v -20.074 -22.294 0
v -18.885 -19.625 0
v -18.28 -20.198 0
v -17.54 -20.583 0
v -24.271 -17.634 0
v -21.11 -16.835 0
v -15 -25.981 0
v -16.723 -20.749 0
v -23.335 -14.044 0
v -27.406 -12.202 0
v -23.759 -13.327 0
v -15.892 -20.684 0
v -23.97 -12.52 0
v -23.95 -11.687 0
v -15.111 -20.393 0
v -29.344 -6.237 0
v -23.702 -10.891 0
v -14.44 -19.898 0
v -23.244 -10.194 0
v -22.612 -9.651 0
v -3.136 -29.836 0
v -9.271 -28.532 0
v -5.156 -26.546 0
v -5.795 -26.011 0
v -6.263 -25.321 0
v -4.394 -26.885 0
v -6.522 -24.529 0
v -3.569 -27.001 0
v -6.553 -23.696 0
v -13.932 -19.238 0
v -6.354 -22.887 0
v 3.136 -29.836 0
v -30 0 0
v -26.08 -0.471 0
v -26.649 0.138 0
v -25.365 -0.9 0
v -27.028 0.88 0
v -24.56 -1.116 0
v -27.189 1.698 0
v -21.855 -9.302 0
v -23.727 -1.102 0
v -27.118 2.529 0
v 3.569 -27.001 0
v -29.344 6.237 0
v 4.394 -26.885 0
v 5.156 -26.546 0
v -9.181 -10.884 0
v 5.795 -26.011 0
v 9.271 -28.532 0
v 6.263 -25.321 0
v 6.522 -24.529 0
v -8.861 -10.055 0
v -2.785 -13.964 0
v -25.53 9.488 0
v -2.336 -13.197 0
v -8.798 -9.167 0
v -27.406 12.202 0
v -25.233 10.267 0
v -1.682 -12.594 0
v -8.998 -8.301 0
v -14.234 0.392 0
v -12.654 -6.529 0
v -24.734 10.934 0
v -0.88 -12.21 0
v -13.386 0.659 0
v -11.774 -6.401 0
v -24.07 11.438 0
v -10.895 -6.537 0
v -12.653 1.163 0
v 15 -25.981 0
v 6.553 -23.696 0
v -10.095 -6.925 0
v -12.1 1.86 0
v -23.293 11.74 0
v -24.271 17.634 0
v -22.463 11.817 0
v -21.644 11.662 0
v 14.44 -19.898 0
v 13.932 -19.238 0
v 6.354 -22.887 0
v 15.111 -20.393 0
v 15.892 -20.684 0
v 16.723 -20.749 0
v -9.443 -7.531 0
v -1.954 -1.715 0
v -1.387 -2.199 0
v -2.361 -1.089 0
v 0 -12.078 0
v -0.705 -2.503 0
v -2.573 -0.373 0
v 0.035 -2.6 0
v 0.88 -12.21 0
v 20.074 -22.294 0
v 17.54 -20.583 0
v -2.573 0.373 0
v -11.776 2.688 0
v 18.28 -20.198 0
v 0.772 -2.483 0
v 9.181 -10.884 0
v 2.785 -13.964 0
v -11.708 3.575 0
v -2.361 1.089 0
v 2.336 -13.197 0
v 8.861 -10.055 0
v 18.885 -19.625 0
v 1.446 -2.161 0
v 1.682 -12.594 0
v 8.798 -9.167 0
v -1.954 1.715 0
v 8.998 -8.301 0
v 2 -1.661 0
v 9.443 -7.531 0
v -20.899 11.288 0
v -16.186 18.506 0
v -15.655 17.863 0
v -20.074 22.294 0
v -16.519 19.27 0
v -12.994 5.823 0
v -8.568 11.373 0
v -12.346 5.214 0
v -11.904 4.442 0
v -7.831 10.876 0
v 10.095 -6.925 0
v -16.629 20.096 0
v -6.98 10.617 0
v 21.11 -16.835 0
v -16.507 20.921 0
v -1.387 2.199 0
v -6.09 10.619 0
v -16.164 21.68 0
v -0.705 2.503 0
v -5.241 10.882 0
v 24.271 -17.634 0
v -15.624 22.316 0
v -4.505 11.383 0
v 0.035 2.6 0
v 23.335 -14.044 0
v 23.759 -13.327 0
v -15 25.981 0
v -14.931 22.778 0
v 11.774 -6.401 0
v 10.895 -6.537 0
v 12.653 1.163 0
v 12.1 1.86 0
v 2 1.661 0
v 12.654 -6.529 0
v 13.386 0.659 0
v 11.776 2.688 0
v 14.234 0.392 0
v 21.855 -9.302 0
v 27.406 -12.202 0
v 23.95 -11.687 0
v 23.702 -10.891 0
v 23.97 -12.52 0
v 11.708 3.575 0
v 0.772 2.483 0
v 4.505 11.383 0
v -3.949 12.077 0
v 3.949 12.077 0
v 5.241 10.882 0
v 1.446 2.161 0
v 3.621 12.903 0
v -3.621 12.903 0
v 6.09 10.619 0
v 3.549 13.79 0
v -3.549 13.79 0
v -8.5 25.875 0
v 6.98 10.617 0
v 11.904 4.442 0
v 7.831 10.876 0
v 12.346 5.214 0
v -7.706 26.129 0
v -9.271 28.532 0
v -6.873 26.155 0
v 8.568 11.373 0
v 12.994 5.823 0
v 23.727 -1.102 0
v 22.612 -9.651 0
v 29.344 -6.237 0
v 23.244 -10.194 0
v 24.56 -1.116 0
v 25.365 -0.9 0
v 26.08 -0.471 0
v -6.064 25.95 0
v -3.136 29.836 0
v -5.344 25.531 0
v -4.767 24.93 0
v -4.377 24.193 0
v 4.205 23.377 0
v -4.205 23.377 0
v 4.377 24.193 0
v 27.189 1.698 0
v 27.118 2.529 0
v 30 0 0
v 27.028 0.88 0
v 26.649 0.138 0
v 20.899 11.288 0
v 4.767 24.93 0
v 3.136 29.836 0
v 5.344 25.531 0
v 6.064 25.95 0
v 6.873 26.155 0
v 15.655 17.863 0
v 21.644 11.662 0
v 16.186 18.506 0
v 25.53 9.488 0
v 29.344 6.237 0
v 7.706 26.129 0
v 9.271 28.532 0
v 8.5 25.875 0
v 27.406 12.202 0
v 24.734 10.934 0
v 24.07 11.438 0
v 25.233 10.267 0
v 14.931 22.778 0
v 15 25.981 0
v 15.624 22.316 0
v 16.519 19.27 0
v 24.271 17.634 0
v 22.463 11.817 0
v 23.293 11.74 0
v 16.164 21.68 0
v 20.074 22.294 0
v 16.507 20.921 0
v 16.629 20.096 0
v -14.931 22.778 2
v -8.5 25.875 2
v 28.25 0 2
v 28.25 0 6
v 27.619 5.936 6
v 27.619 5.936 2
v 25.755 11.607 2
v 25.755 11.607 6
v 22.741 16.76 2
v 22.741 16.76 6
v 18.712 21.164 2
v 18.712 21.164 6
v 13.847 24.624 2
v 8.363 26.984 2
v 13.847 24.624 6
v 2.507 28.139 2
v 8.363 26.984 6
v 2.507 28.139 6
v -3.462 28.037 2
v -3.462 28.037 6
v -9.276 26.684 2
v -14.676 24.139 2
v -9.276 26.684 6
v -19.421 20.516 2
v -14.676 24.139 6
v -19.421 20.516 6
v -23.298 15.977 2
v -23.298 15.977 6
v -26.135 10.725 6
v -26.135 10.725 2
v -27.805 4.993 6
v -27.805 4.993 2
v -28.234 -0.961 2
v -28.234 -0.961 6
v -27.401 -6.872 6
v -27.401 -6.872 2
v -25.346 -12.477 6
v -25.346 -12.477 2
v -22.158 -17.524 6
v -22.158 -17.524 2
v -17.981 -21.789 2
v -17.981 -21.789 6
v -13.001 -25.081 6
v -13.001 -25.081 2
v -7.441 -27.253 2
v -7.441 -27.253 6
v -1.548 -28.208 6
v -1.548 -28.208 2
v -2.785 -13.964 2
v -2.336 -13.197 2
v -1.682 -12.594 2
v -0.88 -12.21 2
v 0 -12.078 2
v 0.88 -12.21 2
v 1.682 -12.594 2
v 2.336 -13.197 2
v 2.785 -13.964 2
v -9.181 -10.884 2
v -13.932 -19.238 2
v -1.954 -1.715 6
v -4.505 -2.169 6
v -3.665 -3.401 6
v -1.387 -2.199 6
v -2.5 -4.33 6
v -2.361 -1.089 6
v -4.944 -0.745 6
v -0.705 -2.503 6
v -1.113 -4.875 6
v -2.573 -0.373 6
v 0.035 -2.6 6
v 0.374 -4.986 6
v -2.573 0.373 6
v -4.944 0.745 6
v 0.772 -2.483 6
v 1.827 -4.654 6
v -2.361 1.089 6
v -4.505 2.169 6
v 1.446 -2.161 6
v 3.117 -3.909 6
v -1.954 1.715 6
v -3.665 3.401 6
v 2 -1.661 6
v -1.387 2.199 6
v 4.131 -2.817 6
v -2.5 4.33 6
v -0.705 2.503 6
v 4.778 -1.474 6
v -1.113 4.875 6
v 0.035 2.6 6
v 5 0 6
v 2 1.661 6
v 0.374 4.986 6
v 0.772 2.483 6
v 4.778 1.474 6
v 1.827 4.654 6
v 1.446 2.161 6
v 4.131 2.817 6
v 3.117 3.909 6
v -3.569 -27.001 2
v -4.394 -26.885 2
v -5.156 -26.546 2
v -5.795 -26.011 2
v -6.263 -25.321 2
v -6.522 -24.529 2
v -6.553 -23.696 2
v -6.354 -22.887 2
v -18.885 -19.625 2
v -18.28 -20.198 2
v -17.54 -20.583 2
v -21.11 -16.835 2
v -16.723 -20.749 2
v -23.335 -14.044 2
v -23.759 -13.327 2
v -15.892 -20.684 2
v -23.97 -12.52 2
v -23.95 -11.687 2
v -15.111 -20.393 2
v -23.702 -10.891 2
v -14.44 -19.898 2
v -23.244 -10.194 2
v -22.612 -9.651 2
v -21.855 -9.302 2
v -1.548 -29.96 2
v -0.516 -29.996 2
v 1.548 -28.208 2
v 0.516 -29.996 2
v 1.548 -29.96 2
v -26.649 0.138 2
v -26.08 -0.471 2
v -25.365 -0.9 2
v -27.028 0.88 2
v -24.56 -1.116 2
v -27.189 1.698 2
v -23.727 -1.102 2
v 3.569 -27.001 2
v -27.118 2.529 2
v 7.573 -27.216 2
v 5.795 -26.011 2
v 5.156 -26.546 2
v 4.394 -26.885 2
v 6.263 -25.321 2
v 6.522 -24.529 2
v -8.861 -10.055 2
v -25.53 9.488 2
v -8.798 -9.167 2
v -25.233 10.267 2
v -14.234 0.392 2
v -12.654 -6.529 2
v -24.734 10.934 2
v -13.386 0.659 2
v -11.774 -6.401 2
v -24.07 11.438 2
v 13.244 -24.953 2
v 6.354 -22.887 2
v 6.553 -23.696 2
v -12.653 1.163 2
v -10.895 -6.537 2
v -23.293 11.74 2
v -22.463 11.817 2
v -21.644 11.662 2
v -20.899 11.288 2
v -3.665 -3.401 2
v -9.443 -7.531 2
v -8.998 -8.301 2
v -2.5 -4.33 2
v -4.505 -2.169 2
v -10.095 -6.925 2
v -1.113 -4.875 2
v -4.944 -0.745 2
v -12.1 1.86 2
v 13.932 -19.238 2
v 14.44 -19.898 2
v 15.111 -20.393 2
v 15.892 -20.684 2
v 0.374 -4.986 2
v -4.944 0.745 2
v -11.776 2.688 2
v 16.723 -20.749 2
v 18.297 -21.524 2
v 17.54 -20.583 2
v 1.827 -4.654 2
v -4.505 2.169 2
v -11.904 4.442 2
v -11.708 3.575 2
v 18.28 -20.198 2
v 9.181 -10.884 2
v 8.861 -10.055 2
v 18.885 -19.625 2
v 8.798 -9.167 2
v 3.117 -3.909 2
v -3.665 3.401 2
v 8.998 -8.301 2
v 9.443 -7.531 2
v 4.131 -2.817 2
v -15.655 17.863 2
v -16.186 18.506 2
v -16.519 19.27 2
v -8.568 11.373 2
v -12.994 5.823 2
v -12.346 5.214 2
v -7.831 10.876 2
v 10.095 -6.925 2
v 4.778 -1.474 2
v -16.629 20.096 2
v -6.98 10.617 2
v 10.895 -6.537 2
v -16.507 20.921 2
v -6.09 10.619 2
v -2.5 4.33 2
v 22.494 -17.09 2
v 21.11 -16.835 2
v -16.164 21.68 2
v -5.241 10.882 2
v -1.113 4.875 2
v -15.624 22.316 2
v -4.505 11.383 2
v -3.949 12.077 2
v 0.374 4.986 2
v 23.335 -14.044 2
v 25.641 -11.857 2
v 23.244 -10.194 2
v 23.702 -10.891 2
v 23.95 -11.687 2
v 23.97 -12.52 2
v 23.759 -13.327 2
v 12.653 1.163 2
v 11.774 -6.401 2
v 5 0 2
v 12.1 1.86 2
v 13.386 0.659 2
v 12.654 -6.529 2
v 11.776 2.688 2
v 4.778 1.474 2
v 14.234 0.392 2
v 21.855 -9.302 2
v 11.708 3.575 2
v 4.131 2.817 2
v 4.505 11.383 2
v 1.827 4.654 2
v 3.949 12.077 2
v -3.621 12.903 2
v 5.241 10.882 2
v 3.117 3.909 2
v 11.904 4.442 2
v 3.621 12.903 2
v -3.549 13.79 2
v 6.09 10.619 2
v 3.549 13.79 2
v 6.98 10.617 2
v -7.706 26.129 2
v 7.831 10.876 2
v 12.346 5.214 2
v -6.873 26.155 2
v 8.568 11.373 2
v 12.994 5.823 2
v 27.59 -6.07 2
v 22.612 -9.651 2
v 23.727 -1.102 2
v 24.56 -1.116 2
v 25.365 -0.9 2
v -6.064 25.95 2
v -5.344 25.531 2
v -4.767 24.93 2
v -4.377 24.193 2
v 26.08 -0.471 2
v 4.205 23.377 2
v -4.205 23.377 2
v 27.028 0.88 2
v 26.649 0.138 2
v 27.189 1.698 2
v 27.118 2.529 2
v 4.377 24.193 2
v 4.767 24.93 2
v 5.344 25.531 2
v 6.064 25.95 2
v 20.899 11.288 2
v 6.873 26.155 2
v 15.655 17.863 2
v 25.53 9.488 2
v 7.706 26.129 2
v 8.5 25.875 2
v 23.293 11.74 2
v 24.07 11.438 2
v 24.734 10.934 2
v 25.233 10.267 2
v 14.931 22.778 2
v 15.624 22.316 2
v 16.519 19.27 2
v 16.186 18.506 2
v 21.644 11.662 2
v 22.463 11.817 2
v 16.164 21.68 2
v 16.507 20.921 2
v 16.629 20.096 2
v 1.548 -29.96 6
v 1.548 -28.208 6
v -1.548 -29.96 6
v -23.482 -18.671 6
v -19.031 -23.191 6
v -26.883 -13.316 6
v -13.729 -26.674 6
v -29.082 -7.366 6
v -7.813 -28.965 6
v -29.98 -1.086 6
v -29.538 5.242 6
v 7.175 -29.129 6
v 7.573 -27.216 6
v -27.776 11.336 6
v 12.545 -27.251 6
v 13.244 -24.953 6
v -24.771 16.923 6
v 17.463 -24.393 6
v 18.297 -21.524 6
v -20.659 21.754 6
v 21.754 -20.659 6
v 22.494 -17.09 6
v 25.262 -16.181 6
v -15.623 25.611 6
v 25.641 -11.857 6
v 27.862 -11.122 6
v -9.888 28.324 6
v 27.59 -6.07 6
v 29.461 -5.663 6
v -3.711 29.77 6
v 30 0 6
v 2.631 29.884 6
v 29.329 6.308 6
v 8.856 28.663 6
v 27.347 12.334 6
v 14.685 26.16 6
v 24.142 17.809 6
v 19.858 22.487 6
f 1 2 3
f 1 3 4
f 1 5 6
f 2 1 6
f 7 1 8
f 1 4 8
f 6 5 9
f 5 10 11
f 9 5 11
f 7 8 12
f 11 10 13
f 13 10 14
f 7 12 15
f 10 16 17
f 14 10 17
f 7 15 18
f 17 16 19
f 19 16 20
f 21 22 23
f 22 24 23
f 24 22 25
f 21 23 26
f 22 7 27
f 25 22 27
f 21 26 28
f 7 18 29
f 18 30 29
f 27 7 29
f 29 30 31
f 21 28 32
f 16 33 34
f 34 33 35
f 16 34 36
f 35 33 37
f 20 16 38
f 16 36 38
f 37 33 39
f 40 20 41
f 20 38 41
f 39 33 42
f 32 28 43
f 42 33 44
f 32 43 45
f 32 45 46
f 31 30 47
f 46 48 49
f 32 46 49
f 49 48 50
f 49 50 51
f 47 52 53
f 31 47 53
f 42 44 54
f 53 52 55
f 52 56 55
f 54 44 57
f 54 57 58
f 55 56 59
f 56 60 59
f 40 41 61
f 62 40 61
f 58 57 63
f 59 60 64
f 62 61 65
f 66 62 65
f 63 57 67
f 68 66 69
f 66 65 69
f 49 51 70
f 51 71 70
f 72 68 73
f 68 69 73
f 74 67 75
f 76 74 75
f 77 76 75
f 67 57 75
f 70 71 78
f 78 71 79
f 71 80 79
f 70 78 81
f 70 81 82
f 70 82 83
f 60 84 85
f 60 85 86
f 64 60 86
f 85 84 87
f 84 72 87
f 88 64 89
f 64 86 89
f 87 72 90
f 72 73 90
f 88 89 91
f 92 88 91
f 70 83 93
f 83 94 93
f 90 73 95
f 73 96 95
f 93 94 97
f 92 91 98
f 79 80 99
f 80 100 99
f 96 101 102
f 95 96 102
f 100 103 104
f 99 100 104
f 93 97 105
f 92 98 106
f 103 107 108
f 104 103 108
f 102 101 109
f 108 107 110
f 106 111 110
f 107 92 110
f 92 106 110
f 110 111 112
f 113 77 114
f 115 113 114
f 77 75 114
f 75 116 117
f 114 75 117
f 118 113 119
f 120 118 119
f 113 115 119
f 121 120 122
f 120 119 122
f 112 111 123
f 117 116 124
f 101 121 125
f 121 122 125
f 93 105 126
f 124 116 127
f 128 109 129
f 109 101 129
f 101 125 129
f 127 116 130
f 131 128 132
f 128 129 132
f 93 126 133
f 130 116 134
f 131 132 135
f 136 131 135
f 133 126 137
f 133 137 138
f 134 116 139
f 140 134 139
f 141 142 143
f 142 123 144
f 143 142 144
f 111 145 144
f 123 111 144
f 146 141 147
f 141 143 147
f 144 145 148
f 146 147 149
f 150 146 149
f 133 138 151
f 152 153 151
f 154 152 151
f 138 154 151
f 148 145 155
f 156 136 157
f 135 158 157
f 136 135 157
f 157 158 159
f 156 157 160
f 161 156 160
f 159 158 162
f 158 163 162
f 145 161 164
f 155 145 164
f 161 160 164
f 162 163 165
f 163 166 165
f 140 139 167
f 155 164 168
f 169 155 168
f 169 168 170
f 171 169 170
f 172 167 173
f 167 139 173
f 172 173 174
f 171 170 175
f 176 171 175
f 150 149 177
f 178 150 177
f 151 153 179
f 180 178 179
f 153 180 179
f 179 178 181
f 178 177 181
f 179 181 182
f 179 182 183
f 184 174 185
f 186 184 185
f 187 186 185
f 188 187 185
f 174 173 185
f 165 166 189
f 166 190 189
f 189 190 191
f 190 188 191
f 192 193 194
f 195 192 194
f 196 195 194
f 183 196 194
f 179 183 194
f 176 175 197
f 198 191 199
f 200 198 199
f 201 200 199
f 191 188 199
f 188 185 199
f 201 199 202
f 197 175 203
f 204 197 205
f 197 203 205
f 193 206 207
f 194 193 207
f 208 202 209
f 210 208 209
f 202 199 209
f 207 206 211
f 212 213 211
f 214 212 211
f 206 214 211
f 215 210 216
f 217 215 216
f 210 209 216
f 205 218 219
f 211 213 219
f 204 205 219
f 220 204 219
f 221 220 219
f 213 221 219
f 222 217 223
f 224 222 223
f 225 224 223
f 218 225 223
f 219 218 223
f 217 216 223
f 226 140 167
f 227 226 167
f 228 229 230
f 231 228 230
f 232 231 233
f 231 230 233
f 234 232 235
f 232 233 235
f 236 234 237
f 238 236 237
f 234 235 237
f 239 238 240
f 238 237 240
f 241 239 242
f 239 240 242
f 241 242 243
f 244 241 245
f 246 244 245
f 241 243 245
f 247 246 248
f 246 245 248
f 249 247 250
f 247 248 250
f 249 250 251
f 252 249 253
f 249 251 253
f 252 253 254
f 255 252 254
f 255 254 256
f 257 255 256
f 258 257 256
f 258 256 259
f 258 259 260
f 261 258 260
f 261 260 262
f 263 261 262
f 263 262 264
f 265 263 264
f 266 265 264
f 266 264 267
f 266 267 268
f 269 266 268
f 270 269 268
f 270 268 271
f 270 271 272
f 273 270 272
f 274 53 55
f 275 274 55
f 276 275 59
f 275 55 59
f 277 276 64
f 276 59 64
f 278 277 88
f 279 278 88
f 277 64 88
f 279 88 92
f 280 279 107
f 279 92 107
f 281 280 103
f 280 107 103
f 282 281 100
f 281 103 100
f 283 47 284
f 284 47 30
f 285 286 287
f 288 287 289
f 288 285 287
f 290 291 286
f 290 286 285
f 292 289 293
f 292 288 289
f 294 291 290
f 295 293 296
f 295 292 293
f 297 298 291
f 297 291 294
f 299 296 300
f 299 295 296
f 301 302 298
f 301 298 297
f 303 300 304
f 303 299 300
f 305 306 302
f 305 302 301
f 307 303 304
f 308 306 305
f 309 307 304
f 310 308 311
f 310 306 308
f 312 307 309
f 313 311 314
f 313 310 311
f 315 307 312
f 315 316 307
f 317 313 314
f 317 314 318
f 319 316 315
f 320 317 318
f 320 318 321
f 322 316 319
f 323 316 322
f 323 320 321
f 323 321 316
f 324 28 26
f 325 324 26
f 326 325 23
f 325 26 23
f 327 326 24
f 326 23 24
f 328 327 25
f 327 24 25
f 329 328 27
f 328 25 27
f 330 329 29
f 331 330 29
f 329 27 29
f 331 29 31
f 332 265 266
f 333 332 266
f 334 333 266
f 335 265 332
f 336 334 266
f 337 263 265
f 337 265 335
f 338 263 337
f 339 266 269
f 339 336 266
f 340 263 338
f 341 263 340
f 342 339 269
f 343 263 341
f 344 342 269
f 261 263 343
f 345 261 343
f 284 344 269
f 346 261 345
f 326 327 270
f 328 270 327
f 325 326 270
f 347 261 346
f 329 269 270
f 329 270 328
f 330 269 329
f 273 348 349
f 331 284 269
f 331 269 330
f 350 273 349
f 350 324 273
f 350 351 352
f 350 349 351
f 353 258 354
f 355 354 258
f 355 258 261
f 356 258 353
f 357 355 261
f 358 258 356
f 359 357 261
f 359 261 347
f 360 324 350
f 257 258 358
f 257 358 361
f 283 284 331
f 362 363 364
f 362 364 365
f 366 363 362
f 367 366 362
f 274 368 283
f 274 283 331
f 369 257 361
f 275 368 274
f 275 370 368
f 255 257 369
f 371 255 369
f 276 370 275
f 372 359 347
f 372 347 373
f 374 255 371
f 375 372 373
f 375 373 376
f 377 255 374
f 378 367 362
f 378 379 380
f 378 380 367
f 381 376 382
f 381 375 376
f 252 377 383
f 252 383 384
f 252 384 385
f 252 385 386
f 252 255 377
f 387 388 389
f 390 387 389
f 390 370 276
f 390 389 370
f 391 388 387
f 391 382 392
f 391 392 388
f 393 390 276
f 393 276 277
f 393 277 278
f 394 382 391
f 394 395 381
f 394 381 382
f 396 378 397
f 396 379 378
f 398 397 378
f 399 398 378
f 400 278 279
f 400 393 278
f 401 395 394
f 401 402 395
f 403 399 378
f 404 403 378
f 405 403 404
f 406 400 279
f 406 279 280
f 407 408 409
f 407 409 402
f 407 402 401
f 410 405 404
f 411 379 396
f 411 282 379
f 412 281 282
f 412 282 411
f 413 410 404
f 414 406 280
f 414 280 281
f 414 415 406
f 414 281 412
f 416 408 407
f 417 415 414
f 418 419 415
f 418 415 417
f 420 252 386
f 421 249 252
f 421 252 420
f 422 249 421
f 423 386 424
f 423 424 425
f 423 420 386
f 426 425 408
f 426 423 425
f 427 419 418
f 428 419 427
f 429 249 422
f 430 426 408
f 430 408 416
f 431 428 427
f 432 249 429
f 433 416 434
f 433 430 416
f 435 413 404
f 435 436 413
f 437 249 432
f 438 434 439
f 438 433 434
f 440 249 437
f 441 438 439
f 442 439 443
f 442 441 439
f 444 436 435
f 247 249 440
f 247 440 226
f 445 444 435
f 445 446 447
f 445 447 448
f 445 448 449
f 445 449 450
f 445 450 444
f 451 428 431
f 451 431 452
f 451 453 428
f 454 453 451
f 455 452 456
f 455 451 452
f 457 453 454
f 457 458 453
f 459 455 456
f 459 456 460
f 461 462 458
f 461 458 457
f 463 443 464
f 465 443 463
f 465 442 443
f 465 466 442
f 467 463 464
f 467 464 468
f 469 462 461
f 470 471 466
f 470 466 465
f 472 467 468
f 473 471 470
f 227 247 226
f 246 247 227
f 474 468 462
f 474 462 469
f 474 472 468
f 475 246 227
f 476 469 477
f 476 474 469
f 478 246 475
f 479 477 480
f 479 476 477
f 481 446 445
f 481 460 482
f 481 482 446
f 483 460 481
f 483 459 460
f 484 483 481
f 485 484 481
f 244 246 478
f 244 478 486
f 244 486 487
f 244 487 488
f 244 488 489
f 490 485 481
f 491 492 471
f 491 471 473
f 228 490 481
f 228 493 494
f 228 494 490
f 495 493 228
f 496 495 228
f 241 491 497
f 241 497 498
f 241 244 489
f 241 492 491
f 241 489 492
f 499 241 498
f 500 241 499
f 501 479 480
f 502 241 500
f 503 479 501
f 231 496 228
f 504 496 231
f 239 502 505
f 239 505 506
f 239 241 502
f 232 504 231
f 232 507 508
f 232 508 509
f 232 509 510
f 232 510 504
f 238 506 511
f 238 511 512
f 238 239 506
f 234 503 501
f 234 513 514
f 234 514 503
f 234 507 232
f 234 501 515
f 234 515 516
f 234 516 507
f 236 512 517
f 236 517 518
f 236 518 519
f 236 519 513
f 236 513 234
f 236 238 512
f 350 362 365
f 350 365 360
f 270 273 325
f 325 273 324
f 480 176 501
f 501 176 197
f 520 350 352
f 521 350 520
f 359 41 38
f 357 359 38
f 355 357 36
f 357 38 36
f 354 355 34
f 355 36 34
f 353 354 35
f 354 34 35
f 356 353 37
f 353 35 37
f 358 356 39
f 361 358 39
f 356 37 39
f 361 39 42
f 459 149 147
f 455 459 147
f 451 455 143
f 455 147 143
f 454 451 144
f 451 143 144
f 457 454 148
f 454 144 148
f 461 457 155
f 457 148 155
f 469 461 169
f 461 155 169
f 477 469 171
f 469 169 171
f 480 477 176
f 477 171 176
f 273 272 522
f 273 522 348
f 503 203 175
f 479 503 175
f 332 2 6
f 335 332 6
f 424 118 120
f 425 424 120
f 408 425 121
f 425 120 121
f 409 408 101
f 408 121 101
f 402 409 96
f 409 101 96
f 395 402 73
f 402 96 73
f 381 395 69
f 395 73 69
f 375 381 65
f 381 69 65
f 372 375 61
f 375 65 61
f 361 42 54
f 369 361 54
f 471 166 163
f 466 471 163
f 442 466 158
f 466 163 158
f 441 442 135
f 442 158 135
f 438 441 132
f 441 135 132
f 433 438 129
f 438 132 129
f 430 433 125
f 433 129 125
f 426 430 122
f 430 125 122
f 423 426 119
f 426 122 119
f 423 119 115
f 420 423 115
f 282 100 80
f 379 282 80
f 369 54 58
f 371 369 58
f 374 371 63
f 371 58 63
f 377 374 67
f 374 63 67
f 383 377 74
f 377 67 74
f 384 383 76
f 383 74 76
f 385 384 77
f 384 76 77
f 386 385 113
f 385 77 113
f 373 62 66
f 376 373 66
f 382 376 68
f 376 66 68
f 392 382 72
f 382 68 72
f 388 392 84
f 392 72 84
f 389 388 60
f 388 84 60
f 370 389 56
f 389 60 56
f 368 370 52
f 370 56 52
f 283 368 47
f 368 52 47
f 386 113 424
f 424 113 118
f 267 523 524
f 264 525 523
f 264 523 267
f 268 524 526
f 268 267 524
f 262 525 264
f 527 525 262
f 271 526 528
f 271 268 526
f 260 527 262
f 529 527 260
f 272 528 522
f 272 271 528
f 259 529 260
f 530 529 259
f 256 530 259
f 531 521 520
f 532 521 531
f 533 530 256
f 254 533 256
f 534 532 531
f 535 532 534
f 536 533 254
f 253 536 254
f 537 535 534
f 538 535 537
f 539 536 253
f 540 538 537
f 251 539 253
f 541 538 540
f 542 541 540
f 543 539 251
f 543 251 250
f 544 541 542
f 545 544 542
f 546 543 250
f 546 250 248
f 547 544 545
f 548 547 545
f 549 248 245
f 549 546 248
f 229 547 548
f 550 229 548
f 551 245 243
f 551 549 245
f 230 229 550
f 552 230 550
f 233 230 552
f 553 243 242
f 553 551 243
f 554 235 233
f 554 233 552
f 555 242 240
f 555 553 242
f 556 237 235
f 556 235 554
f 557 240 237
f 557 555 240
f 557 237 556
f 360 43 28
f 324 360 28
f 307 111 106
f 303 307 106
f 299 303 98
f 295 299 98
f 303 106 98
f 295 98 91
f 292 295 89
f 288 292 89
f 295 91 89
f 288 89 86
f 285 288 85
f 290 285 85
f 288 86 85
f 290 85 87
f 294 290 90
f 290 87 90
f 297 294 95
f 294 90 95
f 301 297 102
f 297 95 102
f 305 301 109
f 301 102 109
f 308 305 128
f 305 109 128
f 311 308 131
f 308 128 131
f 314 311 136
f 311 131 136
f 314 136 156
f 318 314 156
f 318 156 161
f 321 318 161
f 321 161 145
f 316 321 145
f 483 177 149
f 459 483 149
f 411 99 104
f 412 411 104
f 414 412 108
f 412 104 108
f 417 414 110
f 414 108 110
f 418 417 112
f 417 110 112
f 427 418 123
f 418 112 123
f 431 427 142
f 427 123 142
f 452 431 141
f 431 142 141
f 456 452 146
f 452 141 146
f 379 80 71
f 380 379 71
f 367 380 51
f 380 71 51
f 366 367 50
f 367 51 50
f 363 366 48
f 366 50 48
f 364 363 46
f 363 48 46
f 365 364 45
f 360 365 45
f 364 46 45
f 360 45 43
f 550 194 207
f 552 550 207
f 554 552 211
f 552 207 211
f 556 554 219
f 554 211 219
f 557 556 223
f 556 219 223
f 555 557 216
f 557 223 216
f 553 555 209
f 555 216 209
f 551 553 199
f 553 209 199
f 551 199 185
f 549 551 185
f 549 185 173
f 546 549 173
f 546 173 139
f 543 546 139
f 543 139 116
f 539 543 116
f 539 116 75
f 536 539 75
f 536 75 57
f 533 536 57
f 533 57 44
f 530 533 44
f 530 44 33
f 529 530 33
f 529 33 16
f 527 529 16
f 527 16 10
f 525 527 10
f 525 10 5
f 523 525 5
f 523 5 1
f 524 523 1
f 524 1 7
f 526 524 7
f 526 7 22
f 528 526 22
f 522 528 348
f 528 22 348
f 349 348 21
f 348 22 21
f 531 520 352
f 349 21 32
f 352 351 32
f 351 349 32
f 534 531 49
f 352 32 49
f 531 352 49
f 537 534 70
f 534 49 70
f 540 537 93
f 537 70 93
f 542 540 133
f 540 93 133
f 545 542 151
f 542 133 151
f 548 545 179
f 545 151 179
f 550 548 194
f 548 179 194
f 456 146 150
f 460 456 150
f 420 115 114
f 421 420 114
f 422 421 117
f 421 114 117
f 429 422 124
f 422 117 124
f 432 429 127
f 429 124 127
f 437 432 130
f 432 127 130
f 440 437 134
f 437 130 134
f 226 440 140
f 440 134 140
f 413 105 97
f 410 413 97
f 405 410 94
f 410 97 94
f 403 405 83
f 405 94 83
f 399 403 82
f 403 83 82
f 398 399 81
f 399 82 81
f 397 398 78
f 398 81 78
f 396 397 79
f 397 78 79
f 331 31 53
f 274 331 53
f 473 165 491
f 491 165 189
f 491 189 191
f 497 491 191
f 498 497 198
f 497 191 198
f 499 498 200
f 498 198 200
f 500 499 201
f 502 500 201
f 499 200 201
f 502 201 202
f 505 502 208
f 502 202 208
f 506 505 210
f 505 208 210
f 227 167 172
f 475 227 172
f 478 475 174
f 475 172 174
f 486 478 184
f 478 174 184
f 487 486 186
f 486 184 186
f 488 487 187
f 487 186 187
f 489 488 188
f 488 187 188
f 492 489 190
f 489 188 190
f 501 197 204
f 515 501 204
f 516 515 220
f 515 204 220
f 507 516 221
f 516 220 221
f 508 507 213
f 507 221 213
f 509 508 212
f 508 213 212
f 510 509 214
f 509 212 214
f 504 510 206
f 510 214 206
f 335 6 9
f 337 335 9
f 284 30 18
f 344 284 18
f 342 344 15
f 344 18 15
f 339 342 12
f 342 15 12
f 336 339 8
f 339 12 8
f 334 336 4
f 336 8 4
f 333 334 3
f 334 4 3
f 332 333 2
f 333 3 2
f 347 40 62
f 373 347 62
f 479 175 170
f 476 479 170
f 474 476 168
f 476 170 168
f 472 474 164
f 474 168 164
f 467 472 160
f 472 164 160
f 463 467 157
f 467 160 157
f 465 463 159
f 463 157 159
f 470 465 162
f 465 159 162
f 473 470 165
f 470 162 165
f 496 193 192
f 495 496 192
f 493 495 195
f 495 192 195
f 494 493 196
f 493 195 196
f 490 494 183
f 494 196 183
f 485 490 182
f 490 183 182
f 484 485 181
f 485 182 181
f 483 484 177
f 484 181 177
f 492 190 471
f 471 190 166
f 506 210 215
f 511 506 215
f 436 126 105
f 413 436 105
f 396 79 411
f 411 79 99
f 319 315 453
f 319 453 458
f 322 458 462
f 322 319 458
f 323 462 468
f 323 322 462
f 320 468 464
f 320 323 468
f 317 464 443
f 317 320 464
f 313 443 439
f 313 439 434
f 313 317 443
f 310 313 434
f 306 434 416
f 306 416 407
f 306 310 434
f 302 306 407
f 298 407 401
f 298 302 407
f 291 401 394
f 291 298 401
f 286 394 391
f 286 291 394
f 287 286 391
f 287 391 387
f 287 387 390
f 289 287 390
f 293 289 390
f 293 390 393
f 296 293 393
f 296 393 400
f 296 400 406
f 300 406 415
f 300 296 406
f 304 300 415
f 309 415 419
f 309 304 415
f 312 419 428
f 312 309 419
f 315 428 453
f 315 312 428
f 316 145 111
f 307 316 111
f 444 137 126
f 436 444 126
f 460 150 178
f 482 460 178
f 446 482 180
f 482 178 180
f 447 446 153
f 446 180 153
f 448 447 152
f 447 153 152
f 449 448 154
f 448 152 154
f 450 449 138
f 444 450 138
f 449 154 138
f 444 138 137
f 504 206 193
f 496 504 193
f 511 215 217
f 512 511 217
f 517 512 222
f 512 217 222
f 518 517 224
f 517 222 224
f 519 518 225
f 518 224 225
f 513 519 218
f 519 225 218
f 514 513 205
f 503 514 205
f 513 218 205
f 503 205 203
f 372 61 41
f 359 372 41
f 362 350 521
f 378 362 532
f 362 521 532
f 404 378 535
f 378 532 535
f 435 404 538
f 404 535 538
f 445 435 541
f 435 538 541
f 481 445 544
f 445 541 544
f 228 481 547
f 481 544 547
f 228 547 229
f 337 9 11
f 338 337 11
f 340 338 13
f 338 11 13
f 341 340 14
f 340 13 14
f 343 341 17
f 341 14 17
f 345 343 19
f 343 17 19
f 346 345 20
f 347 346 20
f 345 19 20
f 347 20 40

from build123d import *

# Parameters (mm, degrees)
F0_R     = 30
F1_DEPTH = 6
F2_R     = 28.25
F2_R_2   = 5
F3_DEPTH = 4
F5_W     = 3.095944
F5_H     = 4
F6_DEPTH = 25
F8_DEPTH = 25


with BuildPart() as f1:
    # F0 (on Top) → F1 (new body)
    with BuildSketch(Plane.XY):
        Circle(F0_R)
        with BuildLine():
            ThreePointArc((2, 1.661325), (2.445404, 0.883176), (2.6, 0))
            ThreePointArc((2.6, 0), (2.445404, -0.883176), (2, -1.661325))
            ThreePointArc((2, -1.661325), (-2.6, 0), (2, 1.661325))
        make_face(mode=Mode.SUBTRACT)
        with BuildLine():
            ThreePointArc((2, -1.661325), (2.445404, -0.883176), (2.6, 0))
            ThreePointArc((2.6, 0), (2.445404, 0.883176), (2, 1.661325))
            Line((2, 1.661325), (2, -1.661325))
        make_face()
    extrude(amount=F1_DEPTH)

    # F2 (on face) → F3 (cut)
    with BuildSketch(Plane.XY.offset(6)):
        Circle(F2_R)
        Circle(F2_R_2, mode=Mode.SUBTRACT)
    extrude(amount=-F3_DEPTH, mode=Mode.SUBTRACT)

    # F5 (on offset) → F6 (cut)
    with BuildSketch(Plane.XZ.offset(25)):
        with Locations((0, 8)):
            Rectangle(F5_W, F5_H)
        with Locations((0, 4)):
            Rectangle(F5_W, F5_H)
    extrude(amount=F6_DEPTH, mode=Mode.SUBTRACT)

    # F7 (on face) → F8 (cut)
    with BuildSketch(Plane(origin=(0, 0, 0), x_dir=(1, 0, 0), z_dir=(0, 0, -1))):
        with BuildLine():
            ThreePointArc((-2.78543, 13.964289), (0, 12.078461), (2.78543, 13.964289))
            Line((2.78543, 13.964289), (6.354331, 22.886542))
            ThreePointArc((6.354331, 22.886542), (6.053103, 25.682601), (3.568901, 27.000714))
            Line((3.568901, 27.000714), (0, 27.000714))
            Line((0, 27.000714), (-3.568901, 27.000714))
            ThreePointArc((-3.568901, 27.000714), (-6.053103, 25.682601), (-6.354331, 22.886542))
            Line((-6.354331, 22.886542), (-2.78543, 13.964289))
        make_face()
        with BuildLine():
            ThreePointArc((21.85528, 9.30151), (23.853514, 11.280333), (23.335182, 14.044391))
            Line((23.335182, 14.044391), (21.110008, 16.83467))
            Line((21.110008, 16.83467), (18.884835, 19.624949))
            ThreePointArc((18.884835, 19.624949), (16.305418, 20.745346), (13.931559, 19.237542))
            Line((13.931559, 19.237542), (9.181034, 10.884329))
            ThreePointArc((9.181034, 10.884329), (9.443321, 7.530798), (12.654408, 6.528855))
            Line((12.654408, 6.528855), (21.85528, 9.30151))
        make_face()
        with BuildLine():
            ThreePointArc((20.898757, -11.28775), (23.691742, -11.616255), (25.529595, -9.487645))
            Line((25.529595, -9.487645), (26.32375, -6.008224))
            Line((26.32375, -6.008224), (27.117905, -2.528803))
            ThreePointArc((27.117905, -2.528803), (26.385626, 0.186423), (23.726701, 1.10228))
            Line((23.726701, 1.10228), (14.233992, -0.391753))
            ThreePointArc((14.233992, -0.391753), (11.775629, -2.687711), (12.994359, -5.82294))
            Line((12.994359, -5.82294), (20.898757, -11.28775))
        make_face()
        with BuildLine():
            ThreePointArc((4.205044, -23.377103), (5.689606, -25.765567), (8.499702, -25.875291))
            Line((8.499702, -25.875291), (11.715171, -24.326803))
            Line((11.715171, -24.326803), (14.93064, -22.778315))
            ThreePointArc((14.93064, -22.778315), (16.59692, -20.512881), (15.655153, -17.863021))
            Line((15.655153, -17.863021), (8.568464, -11.372837))
            ThreePointArc((8.568464, -11.372837), (5.240648, -10.882318), (3.549292, -13.789943))
            Line((3.549292, -13.789943), (4.205044, -23.377103))
        make_face()
        with BuildLine():
            ThreePointArc((-15.655153, -17.863021), (-16.59692, -20.512881), (-14.93064, -22.778315))
            Line((-14.93064, -22.778315), (-11.715171, -24.326803))
            Line((-11.715171, -24.326803), (-8.499702, -25.875291))
            ThreePointArc((-8.499702, -25.875291), (-5.689606, -25.765567), (-4.205044, -23.377103))
            Line((-4.205044, -23.377103), (-3.549292, -13.789943))
            ThreePointArc((-3.549292, -13.789943), (-5.240648, -10.882318), (-8.568464, -11.372837))
            Line((-8.568464, -11.372837), (-15.655153, -17.863021))
        make_face()
        with BuildLine():
            ThreePointArc((-23.726701, 1.10228), (-26.385626, 0.186423), (-27.117905, -2.528803))
            Line((-27.117905, -2.528803), (-26.32375, -6.008224))
            Line((-26.32375, -6.008224), (-25.529595, -9.487645))
            ThreePointArc((-25.529595, -9.487645), (-23.691742, -11.616255), (-20.898757, -11.28775))
            Line((-20.898757, -11.28775), (-12.994359, -5.82294))
            ThreePointArc((-12.994359, -5.82294), (-11.775629, -2.687711), (-14.233992, -0.391753))
            Line((-14.233992, -0.391753), (-23.726701, 1.10228))
        make_face()
        with BuildLine():
            ThreePointArc((-13.931559, 19.237542), (-16.305418, 20.745346), (-18.884835, 19.624949))
            Line((-18.884835, 19.624949), (-21.110008, 16.83467))
            Line((-21.110008, 16.83467), (-23.335182, 14.044391))
            ThreePointArc((-23.335182, 14.044391), (-23.853514, 11.280333), (-21.85528, 9.30151))
            Line((-21.85528, 9.30151), (-12.654408, 6.528855))
            ThreePointArc((-12.654408, 6.528855), (-9.443321, 7.530798), (-9.181034, 10.884329))
            Line((-9.181034, 10.884329), (-13.931559, 19.237542))
        make_face()
    extrude(amount=-F8_DEPTH, mode=Mode.SUBTRACT)


solid = f1.part
